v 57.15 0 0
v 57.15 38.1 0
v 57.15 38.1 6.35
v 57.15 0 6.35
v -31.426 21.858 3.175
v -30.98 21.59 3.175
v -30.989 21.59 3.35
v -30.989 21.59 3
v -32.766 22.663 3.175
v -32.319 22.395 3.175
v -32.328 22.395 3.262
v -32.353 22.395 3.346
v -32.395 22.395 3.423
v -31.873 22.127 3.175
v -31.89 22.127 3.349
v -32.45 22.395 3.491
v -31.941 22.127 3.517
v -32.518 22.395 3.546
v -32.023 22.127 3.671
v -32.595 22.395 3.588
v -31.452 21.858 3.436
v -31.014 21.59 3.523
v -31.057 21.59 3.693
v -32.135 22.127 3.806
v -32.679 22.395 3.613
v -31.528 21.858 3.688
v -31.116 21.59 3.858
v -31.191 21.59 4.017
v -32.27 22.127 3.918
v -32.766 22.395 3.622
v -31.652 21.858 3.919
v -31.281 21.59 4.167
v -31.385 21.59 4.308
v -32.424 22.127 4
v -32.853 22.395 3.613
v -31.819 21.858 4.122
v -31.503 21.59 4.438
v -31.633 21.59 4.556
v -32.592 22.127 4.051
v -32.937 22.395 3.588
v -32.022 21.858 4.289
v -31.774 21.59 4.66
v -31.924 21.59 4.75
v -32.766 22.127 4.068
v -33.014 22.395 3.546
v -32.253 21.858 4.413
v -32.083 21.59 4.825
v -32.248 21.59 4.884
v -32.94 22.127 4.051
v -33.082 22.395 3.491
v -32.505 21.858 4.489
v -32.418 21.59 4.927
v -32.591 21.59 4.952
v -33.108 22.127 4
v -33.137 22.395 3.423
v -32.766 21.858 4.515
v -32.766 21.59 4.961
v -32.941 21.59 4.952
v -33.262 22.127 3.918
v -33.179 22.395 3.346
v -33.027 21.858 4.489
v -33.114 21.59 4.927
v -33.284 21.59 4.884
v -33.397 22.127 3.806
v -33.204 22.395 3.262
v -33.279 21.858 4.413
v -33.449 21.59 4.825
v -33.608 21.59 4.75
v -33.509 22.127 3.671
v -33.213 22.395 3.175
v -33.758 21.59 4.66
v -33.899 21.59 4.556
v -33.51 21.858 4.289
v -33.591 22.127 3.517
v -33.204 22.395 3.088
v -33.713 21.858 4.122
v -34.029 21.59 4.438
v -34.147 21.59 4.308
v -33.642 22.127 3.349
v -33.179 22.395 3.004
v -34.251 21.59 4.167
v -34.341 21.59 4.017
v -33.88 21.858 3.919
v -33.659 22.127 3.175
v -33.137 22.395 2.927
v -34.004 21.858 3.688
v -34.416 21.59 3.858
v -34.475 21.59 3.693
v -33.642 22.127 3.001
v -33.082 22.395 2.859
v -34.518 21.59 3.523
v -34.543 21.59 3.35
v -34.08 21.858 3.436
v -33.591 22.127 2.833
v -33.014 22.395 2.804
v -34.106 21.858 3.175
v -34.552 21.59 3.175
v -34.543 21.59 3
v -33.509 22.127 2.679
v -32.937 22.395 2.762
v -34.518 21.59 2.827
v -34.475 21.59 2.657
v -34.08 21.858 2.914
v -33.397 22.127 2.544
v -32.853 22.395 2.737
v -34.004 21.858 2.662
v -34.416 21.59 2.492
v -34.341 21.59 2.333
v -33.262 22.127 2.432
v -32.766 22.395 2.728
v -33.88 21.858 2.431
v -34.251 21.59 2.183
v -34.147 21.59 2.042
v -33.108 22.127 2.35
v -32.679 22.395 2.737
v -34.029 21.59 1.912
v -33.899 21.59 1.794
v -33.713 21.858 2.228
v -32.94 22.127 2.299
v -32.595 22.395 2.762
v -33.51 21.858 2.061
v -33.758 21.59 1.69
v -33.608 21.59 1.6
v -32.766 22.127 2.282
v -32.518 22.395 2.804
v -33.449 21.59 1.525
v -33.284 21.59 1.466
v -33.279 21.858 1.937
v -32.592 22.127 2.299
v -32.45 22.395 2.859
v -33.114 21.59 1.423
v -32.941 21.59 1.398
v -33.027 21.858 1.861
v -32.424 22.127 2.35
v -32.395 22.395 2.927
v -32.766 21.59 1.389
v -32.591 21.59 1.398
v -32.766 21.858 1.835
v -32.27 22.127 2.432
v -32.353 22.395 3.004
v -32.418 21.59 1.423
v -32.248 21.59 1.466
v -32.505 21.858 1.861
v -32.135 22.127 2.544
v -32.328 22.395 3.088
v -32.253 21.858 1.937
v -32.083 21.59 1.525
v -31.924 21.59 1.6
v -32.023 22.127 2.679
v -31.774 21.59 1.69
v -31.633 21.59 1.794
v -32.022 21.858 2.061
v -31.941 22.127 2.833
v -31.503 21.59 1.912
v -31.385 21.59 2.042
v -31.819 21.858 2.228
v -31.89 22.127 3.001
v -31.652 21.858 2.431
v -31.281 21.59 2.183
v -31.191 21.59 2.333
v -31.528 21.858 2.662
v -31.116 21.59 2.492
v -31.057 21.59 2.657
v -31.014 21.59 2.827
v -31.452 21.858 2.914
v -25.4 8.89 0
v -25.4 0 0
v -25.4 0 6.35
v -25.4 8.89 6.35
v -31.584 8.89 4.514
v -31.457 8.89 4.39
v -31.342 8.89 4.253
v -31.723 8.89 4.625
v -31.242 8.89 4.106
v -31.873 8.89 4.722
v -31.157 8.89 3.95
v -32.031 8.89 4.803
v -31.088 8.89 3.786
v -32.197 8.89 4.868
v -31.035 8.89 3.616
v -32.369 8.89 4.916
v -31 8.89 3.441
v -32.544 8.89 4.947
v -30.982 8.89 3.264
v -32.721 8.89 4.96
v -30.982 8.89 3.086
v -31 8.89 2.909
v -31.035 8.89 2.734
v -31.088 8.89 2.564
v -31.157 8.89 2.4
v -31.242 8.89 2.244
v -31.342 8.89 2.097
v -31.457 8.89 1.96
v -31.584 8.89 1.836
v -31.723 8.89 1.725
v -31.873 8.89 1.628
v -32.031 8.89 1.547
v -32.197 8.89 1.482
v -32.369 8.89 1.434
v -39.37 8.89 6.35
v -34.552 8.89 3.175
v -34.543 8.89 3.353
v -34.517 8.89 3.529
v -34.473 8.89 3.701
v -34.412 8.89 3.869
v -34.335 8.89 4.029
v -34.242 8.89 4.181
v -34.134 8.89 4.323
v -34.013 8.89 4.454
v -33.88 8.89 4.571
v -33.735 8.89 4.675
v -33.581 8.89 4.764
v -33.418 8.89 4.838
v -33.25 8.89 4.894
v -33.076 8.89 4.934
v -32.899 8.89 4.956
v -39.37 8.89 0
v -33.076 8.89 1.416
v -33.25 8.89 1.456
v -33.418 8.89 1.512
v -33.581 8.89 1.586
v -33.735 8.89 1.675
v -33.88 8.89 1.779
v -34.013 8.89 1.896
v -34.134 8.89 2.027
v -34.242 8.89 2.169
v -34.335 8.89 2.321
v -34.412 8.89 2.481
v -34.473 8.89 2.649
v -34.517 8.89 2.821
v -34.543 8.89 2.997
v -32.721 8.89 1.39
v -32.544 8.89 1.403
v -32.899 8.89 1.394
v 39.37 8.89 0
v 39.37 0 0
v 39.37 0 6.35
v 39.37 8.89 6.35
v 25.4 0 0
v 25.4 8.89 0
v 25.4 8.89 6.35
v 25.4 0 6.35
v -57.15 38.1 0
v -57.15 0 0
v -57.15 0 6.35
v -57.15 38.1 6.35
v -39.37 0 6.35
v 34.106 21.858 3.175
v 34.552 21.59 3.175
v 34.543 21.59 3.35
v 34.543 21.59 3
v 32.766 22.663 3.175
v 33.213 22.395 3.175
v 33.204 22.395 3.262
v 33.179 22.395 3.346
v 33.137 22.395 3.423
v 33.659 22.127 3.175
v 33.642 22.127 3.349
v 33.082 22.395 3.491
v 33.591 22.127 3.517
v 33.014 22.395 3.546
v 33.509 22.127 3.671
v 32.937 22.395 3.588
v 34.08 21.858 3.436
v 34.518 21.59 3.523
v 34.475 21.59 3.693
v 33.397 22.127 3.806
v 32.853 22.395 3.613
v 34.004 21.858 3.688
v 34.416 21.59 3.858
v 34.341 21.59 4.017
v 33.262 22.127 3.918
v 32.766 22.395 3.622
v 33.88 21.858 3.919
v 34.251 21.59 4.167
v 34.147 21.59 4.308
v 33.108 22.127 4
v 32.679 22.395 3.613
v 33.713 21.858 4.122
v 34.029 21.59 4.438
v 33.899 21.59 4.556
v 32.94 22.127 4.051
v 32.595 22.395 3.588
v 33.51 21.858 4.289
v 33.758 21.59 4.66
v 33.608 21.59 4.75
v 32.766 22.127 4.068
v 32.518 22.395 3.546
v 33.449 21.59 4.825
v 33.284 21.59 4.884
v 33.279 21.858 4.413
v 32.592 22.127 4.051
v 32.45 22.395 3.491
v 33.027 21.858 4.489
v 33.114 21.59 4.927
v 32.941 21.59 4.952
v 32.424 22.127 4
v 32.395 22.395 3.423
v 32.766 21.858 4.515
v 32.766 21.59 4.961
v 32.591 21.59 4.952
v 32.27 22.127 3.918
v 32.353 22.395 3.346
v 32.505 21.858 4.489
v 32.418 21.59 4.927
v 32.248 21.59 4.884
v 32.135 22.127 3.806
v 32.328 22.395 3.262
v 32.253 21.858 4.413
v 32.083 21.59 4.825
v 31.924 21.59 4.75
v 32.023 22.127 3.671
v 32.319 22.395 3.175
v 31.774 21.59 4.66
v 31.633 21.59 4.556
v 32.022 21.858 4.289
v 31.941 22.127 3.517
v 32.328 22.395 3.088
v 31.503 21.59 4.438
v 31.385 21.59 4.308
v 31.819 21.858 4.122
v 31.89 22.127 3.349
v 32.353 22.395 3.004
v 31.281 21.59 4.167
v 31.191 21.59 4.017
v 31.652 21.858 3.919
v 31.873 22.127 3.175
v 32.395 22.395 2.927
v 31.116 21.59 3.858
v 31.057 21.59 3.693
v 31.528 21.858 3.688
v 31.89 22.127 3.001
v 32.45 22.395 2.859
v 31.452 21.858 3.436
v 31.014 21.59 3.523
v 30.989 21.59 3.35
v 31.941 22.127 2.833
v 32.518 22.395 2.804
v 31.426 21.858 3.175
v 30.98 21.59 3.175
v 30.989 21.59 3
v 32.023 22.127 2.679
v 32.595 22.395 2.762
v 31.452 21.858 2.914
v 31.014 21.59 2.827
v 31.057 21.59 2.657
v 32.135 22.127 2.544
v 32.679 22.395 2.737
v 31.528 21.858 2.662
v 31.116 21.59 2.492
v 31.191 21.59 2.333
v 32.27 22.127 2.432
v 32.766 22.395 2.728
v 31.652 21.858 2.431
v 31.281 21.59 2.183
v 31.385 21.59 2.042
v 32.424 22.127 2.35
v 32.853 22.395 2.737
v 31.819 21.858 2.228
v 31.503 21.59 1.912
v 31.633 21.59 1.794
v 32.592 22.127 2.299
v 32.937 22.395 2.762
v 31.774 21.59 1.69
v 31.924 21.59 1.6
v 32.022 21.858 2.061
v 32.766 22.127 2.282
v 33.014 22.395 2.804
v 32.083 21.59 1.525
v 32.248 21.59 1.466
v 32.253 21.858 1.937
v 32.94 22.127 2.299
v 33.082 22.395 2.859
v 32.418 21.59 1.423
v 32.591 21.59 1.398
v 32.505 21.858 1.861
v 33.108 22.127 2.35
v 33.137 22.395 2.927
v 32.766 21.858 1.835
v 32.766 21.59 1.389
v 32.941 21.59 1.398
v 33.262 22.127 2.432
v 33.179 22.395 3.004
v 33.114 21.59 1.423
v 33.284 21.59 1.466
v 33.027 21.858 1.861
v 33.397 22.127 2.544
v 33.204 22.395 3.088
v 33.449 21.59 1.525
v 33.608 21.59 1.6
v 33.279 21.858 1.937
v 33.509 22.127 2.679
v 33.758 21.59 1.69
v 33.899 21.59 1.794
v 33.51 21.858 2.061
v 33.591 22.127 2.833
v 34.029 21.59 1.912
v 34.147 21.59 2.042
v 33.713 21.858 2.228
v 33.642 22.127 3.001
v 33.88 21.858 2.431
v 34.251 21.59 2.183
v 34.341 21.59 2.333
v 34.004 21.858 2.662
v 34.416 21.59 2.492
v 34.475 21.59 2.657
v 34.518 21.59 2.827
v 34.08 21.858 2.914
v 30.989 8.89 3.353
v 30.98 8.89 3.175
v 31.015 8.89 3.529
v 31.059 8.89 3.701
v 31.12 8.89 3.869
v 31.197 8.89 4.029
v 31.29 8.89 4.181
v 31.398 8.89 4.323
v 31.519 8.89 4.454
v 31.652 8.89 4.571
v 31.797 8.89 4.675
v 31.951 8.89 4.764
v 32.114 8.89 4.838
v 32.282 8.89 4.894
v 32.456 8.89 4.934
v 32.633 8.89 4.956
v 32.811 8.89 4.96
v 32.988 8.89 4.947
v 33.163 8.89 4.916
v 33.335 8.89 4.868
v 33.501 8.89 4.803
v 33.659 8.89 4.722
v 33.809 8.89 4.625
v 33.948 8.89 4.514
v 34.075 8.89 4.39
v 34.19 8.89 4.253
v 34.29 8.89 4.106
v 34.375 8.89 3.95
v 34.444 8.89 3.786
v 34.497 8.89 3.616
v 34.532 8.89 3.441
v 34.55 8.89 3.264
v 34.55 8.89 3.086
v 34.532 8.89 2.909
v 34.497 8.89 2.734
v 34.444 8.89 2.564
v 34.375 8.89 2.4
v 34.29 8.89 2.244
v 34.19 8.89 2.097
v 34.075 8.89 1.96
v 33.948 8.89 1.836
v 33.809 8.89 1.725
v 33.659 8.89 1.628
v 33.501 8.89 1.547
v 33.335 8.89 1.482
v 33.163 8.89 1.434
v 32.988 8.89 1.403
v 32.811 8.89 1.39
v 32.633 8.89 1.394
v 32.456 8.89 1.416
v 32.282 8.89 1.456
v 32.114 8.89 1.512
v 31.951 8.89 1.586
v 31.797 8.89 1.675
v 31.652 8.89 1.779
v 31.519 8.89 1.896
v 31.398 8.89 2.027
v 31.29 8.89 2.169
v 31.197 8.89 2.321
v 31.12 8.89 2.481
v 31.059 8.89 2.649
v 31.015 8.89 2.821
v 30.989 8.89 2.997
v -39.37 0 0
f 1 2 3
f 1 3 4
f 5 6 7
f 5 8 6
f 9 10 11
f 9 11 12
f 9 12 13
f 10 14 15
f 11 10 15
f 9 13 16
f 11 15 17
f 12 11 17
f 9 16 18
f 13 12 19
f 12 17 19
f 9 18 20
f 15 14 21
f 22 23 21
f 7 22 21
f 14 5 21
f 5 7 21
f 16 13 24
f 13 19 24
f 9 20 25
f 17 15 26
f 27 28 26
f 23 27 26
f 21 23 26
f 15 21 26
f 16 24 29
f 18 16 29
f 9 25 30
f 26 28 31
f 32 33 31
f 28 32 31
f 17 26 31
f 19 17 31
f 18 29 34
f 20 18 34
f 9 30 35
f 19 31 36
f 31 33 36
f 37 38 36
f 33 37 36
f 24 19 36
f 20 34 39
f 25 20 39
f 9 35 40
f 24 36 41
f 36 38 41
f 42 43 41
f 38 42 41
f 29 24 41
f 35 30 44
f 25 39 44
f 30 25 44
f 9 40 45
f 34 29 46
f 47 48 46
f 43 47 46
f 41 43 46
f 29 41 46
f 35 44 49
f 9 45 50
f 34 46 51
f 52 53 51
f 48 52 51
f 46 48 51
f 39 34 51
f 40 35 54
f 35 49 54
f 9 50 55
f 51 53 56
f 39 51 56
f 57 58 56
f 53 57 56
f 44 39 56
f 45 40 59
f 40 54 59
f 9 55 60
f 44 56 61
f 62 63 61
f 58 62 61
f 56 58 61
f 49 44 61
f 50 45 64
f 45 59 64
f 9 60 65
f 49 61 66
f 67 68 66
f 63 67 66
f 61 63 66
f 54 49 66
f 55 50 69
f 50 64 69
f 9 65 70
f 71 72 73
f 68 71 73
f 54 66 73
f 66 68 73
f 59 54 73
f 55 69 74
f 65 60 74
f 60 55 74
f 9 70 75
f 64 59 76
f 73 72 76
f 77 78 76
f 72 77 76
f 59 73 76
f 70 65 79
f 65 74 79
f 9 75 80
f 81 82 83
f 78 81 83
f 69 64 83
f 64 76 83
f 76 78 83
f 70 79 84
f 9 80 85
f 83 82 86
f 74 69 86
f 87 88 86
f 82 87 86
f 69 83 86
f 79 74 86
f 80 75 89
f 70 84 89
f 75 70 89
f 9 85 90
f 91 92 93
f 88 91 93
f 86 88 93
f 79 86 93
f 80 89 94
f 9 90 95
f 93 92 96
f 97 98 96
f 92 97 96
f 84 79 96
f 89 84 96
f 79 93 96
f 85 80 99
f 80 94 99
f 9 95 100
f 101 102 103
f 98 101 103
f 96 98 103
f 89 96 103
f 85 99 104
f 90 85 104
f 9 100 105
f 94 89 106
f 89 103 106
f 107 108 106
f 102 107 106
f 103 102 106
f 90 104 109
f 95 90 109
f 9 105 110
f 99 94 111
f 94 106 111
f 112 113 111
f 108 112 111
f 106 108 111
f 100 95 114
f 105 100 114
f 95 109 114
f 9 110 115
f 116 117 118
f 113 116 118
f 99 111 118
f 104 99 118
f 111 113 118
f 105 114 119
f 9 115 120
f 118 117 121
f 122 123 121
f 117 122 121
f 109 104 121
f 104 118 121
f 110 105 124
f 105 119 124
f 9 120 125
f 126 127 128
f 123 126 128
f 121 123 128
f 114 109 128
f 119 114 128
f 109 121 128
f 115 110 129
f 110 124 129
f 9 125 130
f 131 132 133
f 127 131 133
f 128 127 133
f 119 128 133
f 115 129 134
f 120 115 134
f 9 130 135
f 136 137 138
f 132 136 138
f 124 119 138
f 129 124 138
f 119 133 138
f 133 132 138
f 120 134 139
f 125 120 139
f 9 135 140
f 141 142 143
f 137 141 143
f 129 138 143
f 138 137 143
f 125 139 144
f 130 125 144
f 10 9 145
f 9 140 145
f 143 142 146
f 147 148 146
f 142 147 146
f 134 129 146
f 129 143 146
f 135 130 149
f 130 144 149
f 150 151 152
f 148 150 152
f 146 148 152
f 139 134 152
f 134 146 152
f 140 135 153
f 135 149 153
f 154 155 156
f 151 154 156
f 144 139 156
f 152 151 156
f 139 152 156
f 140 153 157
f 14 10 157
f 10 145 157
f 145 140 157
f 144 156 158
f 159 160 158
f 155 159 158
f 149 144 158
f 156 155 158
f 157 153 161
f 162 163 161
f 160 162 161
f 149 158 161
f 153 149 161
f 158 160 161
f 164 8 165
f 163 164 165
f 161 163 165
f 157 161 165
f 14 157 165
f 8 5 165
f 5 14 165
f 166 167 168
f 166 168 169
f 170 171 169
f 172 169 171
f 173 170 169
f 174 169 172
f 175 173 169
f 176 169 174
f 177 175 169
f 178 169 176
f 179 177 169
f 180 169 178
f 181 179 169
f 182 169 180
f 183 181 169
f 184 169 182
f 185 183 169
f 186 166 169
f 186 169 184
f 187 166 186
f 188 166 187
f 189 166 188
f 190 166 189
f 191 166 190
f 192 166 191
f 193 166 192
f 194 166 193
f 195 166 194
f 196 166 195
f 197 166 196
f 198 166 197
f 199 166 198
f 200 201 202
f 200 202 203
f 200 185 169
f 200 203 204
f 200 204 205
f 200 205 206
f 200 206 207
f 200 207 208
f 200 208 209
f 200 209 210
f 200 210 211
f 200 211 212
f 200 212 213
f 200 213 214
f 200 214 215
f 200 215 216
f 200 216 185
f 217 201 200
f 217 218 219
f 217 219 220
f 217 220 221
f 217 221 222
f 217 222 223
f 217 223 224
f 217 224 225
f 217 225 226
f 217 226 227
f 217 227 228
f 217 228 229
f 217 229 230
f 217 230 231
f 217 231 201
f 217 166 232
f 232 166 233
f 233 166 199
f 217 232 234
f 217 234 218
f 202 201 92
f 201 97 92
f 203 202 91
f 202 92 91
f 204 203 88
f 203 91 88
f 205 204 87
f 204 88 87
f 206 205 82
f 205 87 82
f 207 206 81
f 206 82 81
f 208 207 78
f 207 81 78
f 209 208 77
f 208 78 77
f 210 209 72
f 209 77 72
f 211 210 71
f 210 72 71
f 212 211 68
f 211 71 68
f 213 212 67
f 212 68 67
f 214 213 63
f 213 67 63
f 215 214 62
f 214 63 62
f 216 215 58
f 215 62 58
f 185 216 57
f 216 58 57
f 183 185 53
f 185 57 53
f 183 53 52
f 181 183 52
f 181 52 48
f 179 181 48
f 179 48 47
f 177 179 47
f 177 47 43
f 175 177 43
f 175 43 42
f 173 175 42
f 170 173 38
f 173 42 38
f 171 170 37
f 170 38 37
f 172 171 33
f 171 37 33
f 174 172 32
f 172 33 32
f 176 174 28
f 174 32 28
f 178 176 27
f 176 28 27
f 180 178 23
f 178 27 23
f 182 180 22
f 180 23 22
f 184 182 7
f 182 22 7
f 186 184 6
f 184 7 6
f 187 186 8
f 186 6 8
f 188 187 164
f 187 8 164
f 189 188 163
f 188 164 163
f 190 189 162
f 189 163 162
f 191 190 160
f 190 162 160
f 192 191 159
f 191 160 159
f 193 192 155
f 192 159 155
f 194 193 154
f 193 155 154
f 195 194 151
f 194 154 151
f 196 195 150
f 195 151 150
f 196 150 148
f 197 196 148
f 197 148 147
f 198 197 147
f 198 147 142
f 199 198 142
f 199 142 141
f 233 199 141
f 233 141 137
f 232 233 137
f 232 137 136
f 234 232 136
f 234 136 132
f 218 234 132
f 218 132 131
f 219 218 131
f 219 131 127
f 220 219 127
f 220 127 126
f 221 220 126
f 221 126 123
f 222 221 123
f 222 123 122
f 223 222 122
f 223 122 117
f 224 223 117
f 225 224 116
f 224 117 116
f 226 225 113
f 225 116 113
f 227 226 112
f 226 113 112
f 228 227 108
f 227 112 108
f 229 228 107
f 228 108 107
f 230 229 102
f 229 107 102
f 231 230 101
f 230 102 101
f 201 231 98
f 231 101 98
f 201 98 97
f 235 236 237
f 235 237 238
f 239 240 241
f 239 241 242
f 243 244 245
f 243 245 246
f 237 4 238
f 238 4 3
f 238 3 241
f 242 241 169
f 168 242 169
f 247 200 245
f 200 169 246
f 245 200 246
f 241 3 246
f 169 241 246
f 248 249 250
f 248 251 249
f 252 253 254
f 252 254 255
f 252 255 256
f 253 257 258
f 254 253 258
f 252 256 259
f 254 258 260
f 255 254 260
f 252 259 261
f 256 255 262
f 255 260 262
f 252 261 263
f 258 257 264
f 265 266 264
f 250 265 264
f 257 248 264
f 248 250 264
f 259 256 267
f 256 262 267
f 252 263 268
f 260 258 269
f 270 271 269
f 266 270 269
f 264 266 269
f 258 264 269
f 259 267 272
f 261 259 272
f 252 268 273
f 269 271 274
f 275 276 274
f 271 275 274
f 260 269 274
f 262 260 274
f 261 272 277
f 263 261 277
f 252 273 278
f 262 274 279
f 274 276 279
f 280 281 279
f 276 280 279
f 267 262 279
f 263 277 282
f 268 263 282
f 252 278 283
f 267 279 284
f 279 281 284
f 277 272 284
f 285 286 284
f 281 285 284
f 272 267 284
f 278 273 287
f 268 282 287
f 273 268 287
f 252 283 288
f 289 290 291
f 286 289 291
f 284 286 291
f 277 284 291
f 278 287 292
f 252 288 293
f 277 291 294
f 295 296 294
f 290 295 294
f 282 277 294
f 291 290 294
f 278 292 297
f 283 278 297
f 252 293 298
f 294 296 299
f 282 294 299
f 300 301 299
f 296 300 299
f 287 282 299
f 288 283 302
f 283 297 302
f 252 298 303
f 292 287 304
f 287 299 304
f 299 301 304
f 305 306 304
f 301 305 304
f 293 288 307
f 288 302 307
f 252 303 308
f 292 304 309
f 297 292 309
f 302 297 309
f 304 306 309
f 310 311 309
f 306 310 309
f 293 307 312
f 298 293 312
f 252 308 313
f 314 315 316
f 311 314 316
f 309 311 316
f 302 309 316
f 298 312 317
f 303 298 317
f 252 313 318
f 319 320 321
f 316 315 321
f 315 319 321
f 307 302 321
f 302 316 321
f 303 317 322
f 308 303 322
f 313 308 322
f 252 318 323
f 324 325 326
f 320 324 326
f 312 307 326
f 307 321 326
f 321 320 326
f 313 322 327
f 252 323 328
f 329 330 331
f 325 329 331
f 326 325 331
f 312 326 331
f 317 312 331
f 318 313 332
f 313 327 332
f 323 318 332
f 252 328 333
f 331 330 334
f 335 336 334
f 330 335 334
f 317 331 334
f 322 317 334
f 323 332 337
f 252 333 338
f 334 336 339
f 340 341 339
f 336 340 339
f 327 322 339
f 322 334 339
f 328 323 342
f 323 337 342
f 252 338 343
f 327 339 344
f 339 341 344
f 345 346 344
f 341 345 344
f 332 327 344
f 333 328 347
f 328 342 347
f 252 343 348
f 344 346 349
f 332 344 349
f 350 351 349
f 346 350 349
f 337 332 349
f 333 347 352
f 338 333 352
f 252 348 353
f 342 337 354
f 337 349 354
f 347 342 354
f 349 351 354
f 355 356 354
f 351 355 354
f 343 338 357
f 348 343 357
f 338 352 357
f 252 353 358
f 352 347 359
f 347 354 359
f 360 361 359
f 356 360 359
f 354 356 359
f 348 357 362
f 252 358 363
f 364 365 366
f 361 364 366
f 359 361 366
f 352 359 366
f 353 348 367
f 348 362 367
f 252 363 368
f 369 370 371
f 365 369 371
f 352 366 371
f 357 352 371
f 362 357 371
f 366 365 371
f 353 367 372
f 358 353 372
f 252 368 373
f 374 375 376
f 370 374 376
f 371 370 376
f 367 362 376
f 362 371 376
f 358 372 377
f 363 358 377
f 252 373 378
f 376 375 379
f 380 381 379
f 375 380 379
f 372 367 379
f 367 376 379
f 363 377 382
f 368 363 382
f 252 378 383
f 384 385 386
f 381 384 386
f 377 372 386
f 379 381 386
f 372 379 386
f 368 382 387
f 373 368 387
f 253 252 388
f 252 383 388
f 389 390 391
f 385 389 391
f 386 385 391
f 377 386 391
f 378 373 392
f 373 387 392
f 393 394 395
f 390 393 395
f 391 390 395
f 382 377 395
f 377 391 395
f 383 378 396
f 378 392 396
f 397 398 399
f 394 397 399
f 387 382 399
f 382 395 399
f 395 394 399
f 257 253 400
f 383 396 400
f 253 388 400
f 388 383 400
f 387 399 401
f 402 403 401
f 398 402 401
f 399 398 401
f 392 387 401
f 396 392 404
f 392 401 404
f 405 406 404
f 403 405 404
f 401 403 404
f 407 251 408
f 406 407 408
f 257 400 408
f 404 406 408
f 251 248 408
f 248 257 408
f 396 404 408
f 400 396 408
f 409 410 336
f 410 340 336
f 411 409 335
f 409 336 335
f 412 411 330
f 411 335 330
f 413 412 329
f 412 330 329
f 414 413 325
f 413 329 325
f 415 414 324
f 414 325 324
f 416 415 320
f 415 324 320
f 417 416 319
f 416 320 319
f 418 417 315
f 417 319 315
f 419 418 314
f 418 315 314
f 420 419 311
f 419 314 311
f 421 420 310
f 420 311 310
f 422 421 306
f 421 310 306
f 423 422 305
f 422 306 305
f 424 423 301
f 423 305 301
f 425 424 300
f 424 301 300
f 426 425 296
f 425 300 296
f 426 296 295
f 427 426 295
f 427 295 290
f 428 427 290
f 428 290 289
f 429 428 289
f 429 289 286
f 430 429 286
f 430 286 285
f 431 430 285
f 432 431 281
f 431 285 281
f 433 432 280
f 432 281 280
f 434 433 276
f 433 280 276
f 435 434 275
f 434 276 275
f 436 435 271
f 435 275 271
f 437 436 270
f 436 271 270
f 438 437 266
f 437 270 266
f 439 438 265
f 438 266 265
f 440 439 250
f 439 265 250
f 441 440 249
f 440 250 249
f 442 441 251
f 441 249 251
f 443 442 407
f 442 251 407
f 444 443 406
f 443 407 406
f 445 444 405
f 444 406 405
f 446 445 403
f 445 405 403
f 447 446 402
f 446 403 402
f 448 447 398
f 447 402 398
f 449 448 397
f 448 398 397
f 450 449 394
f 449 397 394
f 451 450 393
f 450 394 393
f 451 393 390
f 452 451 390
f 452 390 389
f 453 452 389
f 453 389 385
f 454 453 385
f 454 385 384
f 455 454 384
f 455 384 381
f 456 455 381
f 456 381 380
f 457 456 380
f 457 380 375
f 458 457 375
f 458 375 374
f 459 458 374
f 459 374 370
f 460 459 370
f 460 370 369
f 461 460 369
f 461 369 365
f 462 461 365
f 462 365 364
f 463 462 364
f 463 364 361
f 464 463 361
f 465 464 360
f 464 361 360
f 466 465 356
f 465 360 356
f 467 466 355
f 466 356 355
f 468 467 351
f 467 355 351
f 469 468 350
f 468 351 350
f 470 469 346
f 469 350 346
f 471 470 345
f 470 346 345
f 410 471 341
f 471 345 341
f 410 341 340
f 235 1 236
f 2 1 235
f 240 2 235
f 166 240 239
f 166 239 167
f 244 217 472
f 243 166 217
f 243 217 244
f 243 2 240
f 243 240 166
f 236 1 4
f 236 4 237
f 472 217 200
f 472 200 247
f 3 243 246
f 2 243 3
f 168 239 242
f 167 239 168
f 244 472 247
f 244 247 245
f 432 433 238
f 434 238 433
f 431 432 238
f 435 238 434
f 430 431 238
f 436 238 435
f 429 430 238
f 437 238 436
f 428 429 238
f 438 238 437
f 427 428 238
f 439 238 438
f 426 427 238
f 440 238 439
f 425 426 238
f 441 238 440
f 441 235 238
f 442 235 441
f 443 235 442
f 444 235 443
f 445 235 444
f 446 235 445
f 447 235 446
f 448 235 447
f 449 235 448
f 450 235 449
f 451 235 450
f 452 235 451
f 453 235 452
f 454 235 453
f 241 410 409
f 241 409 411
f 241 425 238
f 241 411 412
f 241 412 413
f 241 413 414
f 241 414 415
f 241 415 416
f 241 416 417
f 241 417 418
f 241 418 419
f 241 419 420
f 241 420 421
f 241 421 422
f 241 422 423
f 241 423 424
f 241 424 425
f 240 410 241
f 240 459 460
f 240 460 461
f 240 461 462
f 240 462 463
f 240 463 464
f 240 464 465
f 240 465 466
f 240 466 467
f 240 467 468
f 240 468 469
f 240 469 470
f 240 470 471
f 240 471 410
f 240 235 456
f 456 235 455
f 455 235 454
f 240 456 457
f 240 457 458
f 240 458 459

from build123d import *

# Parameters (mm, degrees)
BOSS_EXTRUDE1_DEPTH                 = 6.35
F_9_64_0_14063_DIAMETER_HOLE1_D     = 3.572002
F_9_64_0_14063_DIAMETER_HOLE1_DEPTH = 12.7
F_9_64_0_14063_DIAMETER_HOLE1_TIP   = 1.073137666


with BuildPart() as part:
    # Sketch1 → Boss-Extrude1 (new body)
    with BuildSketch(Plane.XY):
        Polygon((-39.37, 8.89), (-39.37, 0), (-57.15, 0), (-57.15, 38.1), (57.15, 38.1), (57.15, 0), (39.37, 0), (39.37, 8.89), (25.4, 8.89), (25.4, 0), (-25.4, 0), (-25.4, 8.89), align=None)
    extrude(amount=BOSS_EXTRUDE1_DEPTH)

    # 9/64 (0.14063) Diameter Hole1
    with Locations(Plane.XZ.offset(-8.89)):
        with Locations((-32.766, 3.175), (32.766, 3.175)):
            Hole(F_9_64_0_14063_DIAMETER_HOLE1_D / 2, depth=F_9_64_0_14063_DIAMETER_HOLE1_DEPTH)
            with Locations((0, 0, -(F_9_64_0_14063_DIAMETER_HOLE1_DEPTH + F_9_64_0_14063_DIAMETER_HOLE1_TIP / 2))):  # 118° drill point
                Cone(0, F_9_64_0_14063_DIAMETER_HOLE1_D / 2, F_9_64_0_14063_DIAMETER_HOLE1_TIP, mode=Mode.SUBTRACT)


solid = part.part
